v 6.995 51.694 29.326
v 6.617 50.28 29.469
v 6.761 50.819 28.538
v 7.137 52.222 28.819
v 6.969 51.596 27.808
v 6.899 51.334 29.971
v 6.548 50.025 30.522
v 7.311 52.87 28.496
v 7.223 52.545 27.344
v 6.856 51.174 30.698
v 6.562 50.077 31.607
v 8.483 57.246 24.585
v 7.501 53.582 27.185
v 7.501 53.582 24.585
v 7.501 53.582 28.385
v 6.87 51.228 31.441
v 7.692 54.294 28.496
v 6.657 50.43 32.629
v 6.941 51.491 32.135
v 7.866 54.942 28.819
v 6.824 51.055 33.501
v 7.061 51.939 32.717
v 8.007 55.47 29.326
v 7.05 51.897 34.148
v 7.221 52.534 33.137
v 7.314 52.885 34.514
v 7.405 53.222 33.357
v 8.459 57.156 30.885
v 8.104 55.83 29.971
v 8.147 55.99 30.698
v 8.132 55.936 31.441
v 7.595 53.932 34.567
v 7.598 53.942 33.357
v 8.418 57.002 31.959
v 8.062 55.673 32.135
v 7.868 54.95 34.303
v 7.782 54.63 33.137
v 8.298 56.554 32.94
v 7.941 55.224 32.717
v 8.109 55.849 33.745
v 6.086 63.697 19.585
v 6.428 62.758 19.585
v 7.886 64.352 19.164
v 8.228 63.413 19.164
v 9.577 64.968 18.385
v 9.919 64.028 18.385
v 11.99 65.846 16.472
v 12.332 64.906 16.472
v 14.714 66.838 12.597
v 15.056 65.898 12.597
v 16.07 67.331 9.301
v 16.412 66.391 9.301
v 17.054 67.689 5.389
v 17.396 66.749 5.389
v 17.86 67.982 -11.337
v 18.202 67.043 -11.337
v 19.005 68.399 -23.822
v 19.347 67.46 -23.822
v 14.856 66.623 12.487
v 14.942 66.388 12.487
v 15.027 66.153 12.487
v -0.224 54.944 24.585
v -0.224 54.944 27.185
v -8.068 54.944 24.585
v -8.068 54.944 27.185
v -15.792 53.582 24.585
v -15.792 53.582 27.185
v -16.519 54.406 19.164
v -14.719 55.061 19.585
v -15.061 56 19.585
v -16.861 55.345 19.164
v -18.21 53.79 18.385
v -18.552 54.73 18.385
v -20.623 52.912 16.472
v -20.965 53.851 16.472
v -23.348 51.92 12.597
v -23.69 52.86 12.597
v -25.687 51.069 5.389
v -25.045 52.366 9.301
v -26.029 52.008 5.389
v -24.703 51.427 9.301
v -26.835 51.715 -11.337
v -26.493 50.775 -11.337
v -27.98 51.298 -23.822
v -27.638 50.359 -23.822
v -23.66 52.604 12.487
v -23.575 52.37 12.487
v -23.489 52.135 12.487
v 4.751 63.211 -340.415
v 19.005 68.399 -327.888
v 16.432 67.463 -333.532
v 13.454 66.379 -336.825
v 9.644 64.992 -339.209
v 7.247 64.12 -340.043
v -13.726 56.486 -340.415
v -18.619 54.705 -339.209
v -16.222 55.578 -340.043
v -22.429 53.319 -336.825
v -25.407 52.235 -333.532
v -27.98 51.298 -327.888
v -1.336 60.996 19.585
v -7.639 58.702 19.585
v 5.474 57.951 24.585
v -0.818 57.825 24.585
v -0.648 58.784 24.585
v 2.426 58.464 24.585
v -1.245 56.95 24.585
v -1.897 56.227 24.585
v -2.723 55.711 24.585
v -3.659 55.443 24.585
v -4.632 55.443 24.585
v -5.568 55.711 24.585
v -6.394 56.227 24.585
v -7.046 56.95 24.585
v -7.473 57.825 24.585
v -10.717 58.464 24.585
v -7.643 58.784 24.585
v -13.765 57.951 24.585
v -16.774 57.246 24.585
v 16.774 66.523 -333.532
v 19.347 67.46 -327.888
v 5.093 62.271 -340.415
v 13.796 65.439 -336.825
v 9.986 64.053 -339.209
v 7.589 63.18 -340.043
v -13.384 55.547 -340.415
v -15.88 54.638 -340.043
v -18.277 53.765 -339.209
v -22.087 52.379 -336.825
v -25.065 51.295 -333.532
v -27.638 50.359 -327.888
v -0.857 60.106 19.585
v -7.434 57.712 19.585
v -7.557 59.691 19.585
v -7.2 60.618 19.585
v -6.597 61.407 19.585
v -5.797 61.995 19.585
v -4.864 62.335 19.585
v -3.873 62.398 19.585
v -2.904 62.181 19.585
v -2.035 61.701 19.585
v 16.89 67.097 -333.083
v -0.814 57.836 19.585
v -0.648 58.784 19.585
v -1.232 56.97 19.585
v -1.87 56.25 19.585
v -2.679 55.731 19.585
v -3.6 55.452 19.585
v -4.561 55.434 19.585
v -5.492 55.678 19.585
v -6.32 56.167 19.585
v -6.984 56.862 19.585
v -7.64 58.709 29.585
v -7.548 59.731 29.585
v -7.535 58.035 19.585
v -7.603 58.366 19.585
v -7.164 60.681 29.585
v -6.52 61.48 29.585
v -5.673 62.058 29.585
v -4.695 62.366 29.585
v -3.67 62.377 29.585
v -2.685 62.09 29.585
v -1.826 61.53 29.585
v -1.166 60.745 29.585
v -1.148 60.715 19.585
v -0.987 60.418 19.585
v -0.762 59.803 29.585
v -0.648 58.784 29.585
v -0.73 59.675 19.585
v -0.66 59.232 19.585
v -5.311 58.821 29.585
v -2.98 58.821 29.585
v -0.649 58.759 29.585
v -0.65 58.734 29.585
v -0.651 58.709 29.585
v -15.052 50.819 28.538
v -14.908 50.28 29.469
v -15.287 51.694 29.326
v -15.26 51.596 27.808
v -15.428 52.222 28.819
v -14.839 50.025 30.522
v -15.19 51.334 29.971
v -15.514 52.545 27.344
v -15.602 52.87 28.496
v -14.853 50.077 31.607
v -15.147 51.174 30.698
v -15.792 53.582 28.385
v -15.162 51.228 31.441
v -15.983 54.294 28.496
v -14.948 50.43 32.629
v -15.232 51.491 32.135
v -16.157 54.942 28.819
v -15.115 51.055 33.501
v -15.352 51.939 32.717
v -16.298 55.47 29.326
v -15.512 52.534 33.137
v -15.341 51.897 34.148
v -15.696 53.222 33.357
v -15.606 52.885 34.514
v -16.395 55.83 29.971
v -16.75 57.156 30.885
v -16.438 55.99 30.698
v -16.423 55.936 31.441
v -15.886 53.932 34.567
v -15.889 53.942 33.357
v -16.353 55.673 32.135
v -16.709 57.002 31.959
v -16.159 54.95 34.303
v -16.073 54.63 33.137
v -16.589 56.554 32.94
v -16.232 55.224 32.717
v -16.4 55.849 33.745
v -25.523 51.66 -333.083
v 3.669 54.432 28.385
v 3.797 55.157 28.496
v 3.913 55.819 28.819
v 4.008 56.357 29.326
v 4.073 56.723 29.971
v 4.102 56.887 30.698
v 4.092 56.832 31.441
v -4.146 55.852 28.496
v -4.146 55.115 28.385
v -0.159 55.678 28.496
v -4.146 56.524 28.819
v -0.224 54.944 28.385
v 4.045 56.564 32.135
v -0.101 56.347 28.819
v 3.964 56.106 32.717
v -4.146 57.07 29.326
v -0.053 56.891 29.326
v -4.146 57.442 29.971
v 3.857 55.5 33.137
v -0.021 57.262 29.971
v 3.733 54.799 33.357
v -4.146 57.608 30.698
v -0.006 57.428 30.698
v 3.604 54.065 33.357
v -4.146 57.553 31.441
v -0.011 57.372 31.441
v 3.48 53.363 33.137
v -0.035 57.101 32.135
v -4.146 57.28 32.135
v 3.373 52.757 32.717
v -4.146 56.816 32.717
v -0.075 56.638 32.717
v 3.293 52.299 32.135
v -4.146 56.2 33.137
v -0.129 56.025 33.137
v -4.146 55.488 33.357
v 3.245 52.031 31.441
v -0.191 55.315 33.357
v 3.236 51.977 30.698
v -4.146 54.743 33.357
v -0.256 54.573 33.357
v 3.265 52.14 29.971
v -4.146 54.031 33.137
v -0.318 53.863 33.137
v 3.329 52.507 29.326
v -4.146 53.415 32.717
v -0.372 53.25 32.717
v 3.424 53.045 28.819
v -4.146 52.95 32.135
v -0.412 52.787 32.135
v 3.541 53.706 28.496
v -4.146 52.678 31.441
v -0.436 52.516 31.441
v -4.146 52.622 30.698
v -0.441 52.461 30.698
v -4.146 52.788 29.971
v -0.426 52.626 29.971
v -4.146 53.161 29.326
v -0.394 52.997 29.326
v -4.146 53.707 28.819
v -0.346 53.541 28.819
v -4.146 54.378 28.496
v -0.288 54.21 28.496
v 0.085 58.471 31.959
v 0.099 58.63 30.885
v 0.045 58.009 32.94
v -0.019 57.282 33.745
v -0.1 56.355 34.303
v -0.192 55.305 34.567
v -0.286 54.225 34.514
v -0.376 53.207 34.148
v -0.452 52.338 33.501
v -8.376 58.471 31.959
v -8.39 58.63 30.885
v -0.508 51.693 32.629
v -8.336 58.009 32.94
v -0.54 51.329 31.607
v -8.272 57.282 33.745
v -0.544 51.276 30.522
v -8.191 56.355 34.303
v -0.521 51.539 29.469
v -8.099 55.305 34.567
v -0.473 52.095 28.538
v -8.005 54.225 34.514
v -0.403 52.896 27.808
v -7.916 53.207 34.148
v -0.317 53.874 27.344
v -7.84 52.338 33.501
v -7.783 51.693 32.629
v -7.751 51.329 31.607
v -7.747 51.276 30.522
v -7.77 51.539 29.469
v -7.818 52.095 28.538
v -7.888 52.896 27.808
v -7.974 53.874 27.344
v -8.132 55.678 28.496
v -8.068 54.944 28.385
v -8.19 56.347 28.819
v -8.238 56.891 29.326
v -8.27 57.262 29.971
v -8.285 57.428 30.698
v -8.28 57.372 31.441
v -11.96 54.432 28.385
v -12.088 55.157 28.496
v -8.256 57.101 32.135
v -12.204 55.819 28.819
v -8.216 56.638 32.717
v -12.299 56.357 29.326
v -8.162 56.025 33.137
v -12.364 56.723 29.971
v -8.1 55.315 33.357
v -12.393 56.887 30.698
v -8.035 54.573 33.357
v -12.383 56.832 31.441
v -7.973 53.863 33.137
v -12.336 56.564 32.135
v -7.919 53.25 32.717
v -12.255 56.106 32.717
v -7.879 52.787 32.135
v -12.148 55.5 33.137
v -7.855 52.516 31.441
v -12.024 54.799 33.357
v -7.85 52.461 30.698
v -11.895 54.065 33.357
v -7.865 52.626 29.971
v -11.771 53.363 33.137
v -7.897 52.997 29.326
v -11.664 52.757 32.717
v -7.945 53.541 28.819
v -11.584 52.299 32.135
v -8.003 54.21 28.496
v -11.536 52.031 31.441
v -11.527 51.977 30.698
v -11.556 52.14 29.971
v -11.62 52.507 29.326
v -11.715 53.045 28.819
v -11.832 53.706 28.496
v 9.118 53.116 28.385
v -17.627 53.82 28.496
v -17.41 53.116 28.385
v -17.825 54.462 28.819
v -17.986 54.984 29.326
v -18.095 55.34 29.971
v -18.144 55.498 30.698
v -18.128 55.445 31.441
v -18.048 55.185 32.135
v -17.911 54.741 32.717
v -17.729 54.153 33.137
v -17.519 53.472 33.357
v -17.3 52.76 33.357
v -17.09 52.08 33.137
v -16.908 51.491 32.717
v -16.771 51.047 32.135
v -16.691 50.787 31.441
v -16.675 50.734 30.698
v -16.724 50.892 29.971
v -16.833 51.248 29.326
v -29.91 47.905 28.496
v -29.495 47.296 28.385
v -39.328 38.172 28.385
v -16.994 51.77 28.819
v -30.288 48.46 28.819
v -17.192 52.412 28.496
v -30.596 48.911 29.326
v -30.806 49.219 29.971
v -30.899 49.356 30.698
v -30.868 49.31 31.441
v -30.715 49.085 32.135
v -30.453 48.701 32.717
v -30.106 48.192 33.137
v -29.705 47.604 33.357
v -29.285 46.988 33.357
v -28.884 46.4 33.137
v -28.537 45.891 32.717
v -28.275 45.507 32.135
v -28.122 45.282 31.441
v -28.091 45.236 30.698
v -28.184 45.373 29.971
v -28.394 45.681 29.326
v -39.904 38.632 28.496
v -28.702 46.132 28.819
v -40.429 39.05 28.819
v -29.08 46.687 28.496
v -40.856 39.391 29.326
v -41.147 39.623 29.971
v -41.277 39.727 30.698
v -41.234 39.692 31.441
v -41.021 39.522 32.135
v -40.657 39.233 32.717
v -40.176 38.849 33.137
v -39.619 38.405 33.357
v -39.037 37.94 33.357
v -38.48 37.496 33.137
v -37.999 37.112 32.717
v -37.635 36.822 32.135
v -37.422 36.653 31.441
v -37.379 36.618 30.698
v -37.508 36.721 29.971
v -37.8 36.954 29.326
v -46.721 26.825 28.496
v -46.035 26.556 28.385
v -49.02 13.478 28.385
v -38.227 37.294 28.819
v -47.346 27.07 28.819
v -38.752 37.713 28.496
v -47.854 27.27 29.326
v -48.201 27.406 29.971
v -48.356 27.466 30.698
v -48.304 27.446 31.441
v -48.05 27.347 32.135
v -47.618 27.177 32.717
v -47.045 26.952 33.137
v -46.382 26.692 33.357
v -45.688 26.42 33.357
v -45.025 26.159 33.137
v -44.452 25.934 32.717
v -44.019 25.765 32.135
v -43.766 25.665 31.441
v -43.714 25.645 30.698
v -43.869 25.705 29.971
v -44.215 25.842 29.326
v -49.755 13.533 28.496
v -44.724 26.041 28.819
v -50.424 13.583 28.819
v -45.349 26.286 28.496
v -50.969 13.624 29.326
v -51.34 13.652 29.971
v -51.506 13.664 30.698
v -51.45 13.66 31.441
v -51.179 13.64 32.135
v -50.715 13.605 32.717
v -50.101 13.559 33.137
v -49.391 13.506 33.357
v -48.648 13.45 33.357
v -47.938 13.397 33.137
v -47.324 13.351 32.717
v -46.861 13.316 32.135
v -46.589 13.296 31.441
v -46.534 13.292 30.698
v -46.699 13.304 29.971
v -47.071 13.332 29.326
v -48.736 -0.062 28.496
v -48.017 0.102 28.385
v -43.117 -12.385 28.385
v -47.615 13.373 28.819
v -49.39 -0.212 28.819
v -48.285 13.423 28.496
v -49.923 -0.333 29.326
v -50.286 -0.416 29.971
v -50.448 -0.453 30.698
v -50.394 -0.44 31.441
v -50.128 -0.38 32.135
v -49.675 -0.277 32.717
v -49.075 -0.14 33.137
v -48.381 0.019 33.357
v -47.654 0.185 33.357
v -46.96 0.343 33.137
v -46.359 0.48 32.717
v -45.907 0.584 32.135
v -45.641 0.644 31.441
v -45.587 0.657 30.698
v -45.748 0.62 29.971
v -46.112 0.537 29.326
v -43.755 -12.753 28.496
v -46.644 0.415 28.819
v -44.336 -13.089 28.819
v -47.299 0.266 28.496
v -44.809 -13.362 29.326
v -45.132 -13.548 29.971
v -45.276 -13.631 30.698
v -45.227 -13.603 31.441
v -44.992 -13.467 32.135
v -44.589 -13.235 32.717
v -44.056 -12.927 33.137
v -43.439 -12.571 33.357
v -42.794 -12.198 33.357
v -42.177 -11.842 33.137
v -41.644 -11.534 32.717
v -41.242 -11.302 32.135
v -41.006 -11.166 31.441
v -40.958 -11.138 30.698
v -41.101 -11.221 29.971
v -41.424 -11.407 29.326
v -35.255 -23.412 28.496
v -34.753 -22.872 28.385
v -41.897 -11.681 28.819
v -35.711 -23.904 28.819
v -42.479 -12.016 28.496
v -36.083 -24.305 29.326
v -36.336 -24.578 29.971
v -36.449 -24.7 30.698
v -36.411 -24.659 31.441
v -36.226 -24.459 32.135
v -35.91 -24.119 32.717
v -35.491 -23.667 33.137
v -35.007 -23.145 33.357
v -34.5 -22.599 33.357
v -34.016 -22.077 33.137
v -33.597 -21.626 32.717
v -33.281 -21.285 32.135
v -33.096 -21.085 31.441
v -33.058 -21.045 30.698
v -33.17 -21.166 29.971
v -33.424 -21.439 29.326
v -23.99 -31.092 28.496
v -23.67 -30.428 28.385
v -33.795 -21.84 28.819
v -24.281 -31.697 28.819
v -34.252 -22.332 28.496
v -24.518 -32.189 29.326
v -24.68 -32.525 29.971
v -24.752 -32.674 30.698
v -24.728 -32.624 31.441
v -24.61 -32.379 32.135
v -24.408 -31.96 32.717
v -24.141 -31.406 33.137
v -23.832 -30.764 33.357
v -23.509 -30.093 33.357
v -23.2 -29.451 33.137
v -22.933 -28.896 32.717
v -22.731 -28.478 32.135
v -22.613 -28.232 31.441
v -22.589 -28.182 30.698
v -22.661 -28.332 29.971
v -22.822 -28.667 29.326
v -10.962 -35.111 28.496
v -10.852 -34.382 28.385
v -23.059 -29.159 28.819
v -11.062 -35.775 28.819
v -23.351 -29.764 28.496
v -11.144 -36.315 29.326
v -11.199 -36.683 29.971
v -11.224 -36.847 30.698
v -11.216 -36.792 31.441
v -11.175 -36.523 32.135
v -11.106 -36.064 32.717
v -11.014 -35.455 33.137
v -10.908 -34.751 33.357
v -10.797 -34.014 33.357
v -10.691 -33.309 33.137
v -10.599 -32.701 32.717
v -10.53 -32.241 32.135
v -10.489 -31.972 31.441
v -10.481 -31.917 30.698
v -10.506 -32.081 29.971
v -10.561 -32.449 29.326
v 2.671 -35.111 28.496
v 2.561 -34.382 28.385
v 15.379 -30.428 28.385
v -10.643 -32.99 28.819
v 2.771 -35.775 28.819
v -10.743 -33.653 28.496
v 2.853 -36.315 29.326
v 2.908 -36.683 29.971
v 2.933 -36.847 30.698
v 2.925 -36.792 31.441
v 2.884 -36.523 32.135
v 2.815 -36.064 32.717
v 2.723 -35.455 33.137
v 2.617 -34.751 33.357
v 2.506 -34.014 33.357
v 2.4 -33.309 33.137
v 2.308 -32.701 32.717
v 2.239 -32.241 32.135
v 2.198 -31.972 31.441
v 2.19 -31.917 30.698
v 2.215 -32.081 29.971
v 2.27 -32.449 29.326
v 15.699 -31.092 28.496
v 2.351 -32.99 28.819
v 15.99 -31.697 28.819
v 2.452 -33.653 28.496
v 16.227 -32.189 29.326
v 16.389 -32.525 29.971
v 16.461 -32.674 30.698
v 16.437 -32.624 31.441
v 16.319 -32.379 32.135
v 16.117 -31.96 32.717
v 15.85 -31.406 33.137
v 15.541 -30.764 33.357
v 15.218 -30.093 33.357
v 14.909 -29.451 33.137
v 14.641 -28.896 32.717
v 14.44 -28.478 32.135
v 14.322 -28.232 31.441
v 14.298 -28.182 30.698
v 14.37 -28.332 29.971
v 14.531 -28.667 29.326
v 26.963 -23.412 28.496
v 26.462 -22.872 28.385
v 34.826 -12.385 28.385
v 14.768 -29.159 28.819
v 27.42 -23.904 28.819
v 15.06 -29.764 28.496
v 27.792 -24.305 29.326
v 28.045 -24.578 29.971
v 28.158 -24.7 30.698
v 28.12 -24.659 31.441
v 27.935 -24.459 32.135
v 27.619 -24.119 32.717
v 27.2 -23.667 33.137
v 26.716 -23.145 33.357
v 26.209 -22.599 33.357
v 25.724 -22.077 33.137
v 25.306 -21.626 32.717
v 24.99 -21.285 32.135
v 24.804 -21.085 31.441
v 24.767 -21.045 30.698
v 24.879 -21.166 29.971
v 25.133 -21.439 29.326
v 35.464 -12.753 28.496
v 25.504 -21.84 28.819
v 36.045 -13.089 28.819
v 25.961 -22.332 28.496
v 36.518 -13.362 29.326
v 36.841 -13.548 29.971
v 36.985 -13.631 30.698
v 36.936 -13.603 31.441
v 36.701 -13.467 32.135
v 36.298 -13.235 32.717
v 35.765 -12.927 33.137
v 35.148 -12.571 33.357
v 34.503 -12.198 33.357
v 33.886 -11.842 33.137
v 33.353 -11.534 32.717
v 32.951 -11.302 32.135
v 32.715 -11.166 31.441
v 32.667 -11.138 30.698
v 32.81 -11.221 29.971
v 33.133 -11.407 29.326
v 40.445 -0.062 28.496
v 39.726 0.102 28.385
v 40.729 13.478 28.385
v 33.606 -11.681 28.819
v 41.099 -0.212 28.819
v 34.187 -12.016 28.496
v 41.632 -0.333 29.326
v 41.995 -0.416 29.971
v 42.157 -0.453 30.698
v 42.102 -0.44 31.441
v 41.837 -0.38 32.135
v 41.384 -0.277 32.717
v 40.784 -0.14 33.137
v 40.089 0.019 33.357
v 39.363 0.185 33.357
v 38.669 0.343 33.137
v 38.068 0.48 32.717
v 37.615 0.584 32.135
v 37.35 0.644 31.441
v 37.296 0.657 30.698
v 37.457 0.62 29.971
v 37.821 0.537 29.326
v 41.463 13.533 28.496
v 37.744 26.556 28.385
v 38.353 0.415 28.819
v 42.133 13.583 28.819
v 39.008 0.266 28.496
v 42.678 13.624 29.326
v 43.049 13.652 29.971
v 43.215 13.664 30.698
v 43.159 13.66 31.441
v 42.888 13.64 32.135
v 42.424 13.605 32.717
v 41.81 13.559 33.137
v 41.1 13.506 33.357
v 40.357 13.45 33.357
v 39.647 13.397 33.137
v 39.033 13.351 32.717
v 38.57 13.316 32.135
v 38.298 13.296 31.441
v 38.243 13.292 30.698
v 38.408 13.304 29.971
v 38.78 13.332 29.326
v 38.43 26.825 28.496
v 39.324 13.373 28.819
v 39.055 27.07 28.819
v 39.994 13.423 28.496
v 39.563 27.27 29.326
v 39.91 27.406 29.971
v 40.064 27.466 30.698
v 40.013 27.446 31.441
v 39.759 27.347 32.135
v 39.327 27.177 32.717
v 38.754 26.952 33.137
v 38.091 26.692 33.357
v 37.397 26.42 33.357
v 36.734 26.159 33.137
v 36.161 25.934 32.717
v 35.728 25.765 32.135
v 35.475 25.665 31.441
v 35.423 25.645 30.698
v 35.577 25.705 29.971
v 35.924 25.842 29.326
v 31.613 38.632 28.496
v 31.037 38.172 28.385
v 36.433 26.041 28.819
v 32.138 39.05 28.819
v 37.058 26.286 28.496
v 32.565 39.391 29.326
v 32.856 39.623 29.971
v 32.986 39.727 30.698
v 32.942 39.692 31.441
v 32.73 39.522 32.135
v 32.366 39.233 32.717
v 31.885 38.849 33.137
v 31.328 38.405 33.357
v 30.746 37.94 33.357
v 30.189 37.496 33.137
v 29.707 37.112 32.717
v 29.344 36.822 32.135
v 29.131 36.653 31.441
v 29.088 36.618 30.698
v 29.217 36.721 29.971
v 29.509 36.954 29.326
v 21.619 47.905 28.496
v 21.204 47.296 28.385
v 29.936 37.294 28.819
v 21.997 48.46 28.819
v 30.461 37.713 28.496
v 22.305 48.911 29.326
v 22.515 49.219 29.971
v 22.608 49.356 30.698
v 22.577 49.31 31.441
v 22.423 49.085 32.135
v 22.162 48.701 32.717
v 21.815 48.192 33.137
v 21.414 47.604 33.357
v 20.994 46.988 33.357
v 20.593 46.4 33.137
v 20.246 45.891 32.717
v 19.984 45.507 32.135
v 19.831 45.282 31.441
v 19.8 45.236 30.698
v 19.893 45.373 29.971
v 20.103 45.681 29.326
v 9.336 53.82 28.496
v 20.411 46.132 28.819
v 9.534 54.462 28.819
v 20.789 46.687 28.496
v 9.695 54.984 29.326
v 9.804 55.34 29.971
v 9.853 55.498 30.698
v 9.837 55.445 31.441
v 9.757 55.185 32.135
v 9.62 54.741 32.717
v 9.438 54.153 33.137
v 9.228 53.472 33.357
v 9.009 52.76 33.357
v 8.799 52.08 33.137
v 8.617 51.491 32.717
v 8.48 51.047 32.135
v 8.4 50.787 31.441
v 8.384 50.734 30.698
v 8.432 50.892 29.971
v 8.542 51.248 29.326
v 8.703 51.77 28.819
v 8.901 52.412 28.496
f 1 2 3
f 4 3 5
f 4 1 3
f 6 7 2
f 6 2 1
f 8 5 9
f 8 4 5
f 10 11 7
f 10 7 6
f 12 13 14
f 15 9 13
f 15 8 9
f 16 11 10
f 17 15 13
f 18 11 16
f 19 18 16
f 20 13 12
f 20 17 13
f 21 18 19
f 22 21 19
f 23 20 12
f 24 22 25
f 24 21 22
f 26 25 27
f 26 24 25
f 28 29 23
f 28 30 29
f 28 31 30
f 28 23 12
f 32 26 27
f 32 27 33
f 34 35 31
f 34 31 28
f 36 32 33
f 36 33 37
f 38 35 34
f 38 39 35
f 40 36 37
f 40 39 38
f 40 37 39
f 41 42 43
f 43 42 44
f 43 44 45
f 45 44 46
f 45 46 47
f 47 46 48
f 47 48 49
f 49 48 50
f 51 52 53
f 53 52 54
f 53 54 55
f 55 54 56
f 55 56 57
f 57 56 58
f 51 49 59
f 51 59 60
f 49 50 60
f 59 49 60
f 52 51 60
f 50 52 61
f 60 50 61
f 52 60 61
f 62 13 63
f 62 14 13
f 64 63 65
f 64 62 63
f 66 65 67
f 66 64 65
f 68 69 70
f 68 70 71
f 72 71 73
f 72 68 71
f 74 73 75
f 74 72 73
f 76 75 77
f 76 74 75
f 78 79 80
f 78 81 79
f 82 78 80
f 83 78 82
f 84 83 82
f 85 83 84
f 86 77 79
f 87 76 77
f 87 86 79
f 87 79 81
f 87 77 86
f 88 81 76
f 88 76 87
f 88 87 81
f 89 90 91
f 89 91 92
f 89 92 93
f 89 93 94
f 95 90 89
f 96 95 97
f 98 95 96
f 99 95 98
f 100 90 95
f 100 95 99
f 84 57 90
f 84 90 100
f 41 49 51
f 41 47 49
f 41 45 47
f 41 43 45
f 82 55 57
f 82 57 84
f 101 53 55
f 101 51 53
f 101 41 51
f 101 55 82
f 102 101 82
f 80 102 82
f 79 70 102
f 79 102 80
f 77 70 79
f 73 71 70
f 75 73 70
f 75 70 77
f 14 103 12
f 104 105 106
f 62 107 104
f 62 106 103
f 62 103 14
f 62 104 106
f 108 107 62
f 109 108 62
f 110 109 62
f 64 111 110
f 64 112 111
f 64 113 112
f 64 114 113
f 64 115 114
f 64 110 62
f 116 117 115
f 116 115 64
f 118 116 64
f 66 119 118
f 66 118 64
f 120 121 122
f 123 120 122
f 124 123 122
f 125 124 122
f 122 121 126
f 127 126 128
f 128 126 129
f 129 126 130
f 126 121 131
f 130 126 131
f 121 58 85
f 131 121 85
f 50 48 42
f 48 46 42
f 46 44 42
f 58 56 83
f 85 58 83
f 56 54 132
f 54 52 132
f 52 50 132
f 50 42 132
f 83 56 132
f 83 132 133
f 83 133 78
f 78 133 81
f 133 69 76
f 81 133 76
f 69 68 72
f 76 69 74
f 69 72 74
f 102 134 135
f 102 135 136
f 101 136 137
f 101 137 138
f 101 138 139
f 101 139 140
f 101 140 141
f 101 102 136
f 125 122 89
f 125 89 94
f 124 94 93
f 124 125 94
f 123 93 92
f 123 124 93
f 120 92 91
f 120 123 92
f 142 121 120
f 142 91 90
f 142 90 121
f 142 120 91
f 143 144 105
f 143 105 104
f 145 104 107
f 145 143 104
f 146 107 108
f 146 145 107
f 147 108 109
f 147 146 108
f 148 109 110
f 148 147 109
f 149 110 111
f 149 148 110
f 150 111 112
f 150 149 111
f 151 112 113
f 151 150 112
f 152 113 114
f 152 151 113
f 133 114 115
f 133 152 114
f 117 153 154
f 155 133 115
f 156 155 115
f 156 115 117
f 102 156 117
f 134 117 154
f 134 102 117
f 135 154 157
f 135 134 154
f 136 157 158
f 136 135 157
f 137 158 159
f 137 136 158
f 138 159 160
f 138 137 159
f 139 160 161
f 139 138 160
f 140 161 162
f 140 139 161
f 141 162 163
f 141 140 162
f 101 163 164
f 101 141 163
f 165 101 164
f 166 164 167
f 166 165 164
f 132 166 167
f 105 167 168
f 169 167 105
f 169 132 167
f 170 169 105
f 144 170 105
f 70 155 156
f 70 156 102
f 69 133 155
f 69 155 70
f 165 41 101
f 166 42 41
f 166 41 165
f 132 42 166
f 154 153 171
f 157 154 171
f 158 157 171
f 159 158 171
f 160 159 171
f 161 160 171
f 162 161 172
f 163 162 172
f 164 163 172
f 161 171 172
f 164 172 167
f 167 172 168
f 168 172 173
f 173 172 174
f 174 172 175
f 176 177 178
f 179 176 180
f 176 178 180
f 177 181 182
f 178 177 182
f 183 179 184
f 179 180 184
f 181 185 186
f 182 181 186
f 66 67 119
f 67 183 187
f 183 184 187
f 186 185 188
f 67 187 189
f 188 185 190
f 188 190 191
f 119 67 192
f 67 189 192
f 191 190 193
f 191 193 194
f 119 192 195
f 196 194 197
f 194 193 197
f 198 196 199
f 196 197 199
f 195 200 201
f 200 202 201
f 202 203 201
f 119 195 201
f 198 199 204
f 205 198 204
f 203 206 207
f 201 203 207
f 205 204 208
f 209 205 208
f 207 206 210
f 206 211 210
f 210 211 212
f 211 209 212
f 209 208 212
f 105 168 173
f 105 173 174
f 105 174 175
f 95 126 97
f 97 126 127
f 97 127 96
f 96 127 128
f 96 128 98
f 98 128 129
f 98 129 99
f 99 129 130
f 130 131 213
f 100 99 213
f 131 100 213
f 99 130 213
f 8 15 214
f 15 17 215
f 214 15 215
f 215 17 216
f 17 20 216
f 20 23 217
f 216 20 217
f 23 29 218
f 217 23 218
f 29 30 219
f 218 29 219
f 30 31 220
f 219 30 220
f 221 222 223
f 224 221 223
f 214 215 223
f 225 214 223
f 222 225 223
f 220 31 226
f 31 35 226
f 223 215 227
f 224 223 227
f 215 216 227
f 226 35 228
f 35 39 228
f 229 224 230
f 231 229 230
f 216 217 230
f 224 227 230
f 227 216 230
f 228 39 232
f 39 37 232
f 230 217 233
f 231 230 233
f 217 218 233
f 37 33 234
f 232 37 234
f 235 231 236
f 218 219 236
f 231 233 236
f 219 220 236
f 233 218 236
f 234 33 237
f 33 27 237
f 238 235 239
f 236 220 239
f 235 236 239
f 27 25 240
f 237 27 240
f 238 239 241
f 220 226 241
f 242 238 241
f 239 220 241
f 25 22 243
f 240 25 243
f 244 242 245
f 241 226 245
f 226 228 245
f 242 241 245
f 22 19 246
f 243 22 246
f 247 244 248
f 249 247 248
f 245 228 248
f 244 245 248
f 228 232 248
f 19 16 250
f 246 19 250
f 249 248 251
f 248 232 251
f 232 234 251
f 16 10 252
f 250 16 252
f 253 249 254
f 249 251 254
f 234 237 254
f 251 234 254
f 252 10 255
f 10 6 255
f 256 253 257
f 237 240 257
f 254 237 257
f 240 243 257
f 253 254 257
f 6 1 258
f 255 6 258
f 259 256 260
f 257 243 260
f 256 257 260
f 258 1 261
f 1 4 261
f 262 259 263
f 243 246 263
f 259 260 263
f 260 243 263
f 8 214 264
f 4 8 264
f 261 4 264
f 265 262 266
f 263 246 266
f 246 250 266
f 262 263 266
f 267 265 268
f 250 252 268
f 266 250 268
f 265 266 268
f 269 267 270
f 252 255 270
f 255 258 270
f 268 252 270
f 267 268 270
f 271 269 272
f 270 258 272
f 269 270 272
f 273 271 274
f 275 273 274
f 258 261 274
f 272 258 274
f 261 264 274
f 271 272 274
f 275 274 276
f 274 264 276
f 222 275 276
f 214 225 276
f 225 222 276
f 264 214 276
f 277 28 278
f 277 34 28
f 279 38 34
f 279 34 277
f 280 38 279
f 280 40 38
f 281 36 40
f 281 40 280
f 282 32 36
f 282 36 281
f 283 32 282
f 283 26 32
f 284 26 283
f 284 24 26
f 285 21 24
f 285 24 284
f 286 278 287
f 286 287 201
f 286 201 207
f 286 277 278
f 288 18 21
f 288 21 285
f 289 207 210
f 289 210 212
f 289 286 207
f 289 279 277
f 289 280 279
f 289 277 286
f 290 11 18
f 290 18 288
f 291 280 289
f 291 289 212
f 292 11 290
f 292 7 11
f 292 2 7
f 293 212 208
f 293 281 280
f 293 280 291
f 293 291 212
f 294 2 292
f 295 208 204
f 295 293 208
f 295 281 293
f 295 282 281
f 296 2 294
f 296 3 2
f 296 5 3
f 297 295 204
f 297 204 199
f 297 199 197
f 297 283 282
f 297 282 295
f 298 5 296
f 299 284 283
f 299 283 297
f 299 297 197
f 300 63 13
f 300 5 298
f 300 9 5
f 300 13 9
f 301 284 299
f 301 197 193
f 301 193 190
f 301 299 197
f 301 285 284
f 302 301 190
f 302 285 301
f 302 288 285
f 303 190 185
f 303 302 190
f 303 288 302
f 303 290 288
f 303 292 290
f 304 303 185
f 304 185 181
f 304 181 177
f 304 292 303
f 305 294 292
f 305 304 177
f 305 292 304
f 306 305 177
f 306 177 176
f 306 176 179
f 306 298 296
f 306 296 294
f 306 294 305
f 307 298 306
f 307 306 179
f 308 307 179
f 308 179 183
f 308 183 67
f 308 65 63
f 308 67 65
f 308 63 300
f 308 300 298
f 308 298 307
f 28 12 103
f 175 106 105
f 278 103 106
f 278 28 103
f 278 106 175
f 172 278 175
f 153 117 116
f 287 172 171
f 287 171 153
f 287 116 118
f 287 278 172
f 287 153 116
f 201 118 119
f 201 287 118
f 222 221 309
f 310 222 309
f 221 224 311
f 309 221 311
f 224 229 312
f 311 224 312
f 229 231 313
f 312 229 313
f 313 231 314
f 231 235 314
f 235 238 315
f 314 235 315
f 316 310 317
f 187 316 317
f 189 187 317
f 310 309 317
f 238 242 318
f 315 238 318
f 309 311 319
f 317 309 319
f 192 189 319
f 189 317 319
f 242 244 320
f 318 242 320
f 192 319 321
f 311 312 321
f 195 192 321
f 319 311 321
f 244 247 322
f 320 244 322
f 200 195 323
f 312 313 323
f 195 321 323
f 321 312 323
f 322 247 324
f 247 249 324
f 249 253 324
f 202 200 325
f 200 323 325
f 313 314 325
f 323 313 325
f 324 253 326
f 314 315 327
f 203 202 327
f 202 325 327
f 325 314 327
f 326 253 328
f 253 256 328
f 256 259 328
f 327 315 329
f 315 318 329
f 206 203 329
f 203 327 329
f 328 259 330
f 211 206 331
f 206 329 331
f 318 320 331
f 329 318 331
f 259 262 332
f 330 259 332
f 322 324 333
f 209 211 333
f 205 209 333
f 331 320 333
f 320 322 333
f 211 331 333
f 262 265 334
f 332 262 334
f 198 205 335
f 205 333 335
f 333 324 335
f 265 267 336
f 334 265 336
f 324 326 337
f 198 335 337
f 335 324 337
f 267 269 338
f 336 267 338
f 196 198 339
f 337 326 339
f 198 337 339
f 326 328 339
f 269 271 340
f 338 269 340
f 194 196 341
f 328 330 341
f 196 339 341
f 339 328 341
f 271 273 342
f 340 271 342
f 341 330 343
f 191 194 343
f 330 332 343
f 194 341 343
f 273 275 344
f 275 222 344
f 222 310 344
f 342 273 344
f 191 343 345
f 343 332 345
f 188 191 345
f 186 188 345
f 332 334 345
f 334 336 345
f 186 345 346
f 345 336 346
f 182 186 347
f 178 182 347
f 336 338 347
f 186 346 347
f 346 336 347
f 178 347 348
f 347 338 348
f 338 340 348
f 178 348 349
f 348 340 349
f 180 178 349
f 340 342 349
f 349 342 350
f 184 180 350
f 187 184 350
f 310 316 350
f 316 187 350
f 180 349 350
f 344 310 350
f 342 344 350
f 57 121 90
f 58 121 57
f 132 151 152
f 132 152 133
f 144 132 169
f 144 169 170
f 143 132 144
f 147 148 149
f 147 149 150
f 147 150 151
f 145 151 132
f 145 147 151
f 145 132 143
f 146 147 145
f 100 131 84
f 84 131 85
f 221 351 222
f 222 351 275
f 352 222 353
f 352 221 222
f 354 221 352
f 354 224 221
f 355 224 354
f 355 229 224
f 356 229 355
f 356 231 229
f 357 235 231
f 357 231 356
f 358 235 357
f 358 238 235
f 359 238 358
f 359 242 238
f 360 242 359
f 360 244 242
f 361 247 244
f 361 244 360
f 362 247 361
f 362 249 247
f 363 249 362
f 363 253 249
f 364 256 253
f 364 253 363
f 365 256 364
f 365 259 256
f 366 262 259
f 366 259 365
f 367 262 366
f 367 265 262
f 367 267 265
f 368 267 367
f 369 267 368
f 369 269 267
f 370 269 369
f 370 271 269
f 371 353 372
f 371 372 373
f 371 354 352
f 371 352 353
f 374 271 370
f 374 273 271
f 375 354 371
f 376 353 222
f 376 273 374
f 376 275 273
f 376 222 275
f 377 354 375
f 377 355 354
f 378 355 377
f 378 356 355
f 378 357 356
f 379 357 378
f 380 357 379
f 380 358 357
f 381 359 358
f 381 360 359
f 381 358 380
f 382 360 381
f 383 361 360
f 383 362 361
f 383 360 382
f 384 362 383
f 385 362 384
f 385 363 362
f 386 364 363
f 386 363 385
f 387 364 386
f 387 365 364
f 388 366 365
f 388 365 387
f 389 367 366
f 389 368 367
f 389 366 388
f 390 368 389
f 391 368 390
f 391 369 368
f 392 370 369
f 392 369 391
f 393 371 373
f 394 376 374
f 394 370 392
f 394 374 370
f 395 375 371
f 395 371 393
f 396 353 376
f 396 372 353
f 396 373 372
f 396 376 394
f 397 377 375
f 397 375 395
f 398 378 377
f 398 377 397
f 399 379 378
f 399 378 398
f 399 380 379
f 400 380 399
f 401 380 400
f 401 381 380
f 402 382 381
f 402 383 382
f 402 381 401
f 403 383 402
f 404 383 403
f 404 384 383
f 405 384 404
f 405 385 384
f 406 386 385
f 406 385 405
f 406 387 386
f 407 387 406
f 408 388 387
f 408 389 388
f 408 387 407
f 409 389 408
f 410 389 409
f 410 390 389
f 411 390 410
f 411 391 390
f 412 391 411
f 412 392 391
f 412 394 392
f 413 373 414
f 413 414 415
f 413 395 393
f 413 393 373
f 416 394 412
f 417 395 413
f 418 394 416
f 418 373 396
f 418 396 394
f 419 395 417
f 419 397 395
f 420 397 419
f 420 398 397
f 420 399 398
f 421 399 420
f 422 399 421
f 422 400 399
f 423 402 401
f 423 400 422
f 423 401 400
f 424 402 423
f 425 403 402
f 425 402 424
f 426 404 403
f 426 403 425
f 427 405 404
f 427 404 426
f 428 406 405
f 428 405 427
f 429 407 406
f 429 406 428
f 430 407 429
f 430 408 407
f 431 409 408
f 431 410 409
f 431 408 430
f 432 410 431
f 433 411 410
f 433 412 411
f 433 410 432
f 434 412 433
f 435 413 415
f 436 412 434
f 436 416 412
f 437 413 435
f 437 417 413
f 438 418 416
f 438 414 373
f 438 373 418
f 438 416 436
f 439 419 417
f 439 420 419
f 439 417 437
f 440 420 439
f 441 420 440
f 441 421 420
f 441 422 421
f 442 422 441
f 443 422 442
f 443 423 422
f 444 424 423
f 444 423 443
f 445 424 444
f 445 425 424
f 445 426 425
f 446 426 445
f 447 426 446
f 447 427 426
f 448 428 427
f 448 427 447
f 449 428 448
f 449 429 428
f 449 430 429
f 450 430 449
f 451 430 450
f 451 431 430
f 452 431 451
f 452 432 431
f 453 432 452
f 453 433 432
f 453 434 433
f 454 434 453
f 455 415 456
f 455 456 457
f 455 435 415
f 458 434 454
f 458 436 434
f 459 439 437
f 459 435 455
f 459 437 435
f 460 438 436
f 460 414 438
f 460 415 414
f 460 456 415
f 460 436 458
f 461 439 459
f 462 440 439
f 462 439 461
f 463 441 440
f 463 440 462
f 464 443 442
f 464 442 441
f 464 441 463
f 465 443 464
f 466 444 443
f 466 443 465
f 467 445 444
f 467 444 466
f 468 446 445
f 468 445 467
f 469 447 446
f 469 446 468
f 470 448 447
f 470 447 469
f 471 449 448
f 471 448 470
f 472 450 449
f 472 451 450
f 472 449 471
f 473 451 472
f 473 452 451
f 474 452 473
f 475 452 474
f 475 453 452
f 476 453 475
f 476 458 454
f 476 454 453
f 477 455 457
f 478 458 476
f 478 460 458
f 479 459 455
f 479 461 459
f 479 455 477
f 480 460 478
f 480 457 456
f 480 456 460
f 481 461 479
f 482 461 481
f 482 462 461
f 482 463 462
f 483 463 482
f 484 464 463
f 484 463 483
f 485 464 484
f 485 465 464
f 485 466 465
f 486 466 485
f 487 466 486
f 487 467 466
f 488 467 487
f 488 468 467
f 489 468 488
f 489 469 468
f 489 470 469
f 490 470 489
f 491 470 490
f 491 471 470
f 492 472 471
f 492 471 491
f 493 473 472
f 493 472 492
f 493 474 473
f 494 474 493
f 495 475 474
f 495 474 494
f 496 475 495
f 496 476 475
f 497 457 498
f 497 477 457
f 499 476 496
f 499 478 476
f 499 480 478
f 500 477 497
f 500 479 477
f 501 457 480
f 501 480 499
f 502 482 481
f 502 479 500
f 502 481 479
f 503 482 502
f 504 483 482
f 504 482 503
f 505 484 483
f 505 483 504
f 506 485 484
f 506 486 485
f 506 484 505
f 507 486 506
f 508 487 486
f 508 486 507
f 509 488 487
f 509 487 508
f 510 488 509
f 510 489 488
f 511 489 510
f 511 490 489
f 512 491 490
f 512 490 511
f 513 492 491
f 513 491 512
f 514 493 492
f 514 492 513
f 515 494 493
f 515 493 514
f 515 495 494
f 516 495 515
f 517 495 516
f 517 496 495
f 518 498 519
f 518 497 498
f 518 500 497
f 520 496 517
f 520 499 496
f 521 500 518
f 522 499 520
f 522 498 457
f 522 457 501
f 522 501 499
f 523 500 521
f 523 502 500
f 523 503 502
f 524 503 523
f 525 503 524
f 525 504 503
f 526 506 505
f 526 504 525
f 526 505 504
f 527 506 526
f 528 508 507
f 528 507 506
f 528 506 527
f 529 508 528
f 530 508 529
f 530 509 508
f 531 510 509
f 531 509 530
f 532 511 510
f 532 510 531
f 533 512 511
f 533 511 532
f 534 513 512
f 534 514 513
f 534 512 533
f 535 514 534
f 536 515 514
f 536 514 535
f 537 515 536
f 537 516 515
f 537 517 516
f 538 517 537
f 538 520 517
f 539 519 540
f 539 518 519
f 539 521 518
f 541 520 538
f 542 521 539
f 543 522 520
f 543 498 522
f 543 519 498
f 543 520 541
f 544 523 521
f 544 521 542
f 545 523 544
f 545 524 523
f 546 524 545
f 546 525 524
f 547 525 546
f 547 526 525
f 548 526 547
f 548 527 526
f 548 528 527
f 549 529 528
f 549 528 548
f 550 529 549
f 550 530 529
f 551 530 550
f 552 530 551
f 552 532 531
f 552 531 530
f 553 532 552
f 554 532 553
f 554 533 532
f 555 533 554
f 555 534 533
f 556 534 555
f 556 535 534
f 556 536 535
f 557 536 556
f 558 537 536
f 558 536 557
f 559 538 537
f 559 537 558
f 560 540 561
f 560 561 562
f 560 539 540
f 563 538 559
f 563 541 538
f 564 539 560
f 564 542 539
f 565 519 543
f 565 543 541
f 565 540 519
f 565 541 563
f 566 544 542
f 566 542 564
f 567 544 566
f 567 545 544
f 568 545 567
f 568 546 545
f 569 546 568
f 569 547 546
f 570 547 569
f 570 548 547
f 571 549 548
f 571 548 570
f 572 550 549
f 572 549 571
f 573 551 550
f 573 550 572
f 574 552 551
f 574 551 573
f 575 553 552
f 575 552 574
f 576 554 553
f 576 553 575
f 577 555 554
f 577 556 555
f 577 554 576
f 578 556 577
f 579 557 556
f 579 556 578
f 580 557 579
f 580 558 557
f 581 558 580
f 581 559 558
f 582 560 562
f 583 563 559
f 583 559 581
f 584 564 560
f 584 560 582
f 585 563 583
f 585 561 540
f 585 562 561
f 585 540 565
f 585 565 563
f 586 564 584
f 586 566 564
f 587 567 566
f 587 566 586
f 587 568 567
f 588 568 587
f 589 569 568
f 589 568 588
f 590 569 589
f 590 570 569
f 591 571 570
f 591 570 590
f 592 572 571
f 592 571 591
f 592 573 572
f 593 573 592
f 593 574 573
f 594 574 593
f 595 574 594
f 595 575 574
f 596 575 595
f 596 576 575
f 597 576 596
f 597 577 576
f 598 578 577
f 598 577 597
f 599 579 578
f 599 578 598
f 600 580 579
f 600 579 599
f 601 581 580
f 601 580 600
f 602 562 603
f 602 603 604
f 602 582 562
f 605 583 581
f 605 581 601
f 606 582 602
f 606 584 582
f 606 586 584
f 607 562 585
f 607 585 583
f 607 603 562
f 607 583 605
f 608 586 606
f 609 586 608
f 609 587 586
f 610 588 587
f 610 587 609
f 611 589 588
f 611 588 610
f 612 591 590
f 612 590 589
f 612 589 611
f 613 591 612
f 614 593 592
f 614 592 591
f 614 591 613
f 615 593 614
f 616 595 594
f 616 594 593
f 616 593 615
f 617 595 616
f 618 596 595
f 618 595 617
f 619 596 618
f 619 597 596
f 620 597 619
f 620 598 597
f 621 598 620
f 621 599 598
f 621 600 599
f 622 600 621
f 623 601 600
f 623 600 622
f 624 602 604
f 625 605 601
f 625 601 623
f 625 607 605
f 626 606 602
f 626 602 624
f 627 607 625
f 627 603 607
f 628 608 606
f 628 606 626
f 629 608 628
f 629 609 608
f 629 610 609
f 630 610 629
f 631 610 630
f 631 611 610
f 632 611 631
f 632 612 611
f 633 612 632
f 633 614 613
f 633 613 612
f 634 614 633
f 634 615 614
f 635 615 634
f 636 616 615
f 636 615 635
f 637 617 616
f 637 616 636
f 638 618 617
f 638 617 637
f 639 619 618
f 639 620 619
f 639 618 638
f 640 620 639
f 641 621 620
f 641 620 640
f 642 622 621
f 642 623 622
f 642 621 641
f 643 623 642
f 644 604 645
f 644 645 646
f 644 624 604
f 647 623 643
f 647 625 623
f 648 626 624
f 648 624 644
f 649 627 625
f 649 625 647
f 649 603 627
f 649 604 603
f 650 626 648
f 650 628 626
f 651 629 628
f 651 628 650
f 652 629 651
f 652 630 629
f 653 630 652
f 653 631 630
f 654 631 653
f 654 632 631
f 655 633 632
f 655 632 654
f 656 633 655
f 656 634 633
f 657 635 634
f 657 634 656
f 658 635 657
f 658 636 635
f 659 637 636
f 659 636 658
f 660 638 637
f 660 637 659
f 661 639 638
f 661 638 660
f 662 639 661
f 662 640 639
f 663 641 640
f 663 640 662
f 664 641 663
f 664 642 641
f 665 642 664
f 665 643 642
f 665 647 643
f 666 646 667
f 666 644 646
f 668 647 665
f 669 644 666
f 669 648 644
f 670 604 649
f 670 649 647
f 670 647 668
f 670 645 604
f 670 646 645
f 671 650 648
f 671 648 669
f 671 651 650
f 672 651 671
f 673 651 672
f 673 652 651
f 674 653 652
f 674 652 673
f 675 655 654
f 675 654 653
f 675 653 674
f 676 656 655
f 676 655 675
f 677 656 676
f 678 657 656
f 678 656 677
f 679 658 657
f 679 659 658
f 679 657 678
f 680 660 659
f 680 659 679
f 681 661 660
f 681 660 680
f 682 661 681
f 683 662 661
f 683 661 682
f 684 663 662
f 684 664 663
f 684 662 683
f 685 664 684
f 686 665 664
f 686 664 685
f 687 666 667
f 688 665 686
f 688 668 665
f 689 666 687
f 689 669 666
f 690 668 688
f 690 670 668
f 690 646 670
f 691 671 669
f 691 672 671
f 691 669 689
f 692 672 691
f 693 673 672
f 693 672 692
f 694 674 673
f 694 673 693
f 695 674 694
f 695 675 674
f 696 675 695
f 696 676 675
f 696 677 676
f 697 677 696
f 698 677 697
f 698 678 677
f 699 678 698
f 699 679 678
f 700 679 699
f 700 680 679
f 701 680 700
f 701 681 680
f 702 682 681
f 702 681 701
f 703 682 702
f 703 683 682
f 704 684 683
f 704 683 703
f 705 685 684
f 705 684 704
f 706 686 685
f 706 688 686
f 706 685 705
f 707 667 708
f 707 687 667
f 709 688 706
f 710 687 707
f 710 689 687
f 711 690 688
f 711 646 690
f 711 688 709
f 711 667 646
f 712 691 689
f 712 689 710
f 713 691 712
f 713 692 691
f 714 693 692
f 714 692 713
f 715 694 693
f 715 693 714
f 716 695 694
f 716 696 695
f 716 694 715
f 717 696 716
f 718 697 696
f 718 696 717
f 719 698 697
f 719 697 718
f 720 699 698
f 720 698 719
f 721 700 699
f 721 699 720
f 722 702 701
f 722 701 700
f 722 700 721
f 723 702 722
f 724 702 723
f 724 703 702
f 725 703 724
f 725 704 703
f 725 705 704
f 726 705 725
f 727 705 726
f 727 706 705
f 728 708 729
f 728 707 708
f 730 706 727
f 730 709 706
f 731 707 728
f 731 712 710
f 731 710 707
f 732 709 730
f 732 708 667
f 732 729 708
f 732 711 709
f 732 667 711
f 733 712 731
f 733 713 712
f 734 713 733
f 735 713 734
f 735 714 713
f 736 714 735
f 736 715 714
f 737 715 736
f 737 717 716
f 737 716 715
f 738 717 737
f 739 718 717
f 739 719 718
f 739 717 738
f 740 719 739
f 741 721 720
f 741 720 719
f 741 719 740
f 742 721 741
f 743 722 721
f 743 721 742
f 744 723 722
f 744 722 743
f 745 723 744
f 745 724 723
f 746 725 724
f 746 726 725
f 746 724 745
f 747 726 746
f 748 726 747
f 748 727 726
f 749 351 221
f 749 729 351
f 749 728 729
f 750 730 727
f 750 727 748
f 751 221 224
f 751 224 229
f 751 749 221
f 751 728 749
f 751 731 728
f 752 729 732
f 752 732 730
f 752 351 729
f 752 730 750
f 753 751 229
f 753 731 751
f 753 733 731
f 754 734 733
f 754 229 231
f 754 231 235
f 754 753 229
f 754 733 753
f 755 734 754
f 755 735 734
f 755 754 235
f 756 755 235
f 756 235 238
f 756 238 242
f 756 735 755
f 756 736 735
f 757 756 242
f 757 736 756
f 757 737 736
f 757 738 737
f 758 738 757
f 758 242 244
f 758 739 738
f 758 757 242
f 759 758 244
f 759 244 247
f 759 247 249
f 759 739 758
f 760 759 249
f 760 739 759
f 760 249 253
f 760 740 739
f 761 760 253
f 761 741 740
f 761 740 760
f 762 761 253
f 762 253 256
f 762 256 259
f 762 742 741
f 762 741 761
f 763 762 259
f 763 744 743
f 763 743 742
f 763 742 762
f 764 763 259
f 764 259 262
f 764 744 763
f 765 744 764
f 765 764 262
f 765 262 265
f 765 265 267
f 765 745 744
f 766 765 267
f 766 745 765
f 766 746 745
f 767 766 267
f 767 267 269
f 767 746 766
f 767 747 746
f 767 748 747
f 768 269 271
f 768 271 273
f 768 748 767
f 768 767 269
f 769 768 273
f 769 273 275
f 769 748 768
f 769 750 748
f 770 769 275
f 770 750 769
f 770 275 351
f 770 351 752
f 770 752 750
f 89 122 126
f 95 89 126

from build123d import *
from build123d.topology import SkipClean

# Parameters (mm, degrees)
REVOLVE_4_ANGLE          = 30
SKETCH_4_R               = 3.5
EXTRUDE_1_DEPTH          = 5
SKETCH_7_W               = 50
SKETCH_7_H               = 360
EXTRUDE_2_DEPTH          = 1
CUT_EXTRUDE_1_DEPTH      = 343.944475712
CUT_EXTRUDE_1_DEPTH_BACK = 343.944475712
CUT_EXTRUDE_2_DEPTH      = 343.944475826
CUT_EXTRUDE_2_DEPTH_BACK = 343.944475826
SKETCH_10_R              = 2.5
SKETCH_13_R              = 2.5


# Read off the part's stored shape, not the designer's step: 旋转4
with BuildPart() as part:
    # 旋转4 outline → 旋转4 (revolve)
    with BuildSketch(Plane(origin=(-4.145535771, 10.115302746, 0), x_dir=(0.2588190451025214, 0.9659258262890681, 0), z_dir=(0.9659258262890681, -0.2588190451025214, 0))):
        with BuildLine():
            Line((48.79373495, 24.584801914), (48.7, 30.884801913))
            ThreePointArc((48.7, 30.884801913), (42.38370491, 33.501097003), (45, 27.184801913))
            Line((45, 27.184801913), (45, 24.584801914))
            Line((45, 24.584801914), (48.79373495, 24.584801914))
        make_face()
    revolve(axis=Axis((-4.145535771, 10.115302746, 0), (0, 0, 1)), revolution_arc=REVOLVE_4_ANGLE)

    # 草图4 → 凸台-拉伸1 (add, symmetric)
    with SkipClean():  # the faces are left unmerged after this step: merging them gives an invalid solid
        with BuildSketch(Plane(origin=(0, 0, 24.584801914), x_dir=(-1, 0, 0), z_dir=(0, 0, -1))):
            with Locations(Location((4.145535771, 58.909037696, 0), (0, 0, 182.055368844))):
                Circle(SKETCH_4_R)
        extrude(amount=EXTRUDE_1_DEPTH, both=True)

    # 草图7 → 凸台-拉伸2 (add)
    with SkipClean():  # the faces are left unmerged after this step: merging them gives an invalid solid
        with BuildSketch(Plane(origin=(-19.41793533, 53.35033885, 0), x_dir=(-0.9396926207859081, -0.34202014332566943, 0), z_dir=(-0.34202014332566943, 0.9396926207859081, 0))):
            with Locations((-16.252548143, -160.415198086)):
                Rectangle(SKETCH_7_W, SKETCH_7_H)
        extrude(amount=EXTRUDE_2_DEPTH)

    # 草图8 → 切除-拉伸1 (cut, two sides: drawn at the far end of the back side and taken through both)
    with SkipClean():  # the faces are left unmerged after this step: merging them gives an invalid solid
        with BuildSketch(Plane(origin=(-19.759955473, 54.290031471, 0), x_dir=(0.9396926207859082, 0.3420201433256695, 0), z_dir=(-0.3420201433256695, 0.9396926207859082, 0)).offset(-CUT_EXTRUDE_1_DEPTH_BACK)):
            with BuildLine():
                Line((41.252548143, -19.584801914), (41.252548143, 23.821846561))
                add(Edge.make_bspline(
                    [(27.504872765, -19.584801914), (31.73786331, -19.07232861), (36.657141019, -14.263450573), (39.412364189, -5.517206126), (40.655209173, 6.65100326), (39.363996158, 17.087656662), (41.252548143, 23.821846561)],
                    knots=[0.037048612, 0.037048612, 0.037048612, 0.037048612, 0.227677085, 0.340409594, 0.466381752, 0.809603539, 0.809603539, 0.809603539, 0.809603539], degree=3))
                Line((27.504872765, -19.584801914), (41.252548143, -19.584801914))
            make_face()
            with BuildLine():
                Line((-8.747451857, -19.584801914), (5.000223521, -19.584801914))
                add(Edge.make_bspline(
                    [(5.000223521, -19.584801914), (0.767232977, -19.07232861), (-4.152044732, -14.263450573), (-6.907267902, -5.517206126), (-8.150112886, 6.65100326), (-6.858899871, 17.087656662), (-8.747451857, 23.821846561)],
                    knots=[0.037048612, 0.037048612, 0.037048612, 0.037048612, 0.227677085, 0.340409594, 0.466381752, 0.809603539, 0.809603539, 0.809603539, 0.809603539], degree=3))
                Line((-8.747451857, 23.821846561), (-8.747451857, -19.584801914))
            make_face()
        extrude(amount=CUT_EXTRUDE_1_DEPTH + CUT_EXTRUDE_1_DEPTH_BACK, mode=Mode.SUBTRACT)

    # 草图9 → 切除-拉伸2 (cut, two sides: drawn at the far end of the back side and taken through both)
    with SkipClean():  # the faces are left unmerged after this step: merging them gives an invalid solid
        with BuildSketch(Plane(origin=(-19.759955473, 54.290031471, 0), x_dir=(0.9396926207859082, 0.3420201433256695, 0), z_dir=(-0.3420201433256695, 0.9396926207859082, 0)).offset(-CUT_EXTRUDE_2_DEPTH_BACK)):
            with BuildLine():
                add(Edge.make_bspline(
                    [(26.083588303, 340.415198086), (31.006568105, 340.211900579), (38.097666372, 336.040393165), (40.500108091, 329.801156179), (41.252548143, 327.888172846)],
                    knots=[0, 0, 0, 0, 0.427766373, 0.590490453, 0.590490453, 0.590490453, 0.590490453], degree=3))
                Line((41.252548143, 327.888172846), (41.252548143, 340.415198086))
                Line((41.252548143, 340.415198086), (26.083588303, 340.415198086))
            make_face()
            with BuildLine():
                add(Edge.make_bspline(
                    [(6.421507983, 340.415198086), (1.498528181, 340.211900579), (-5.592570086, 336.040393165), (-7.995011804, 329.801156179), (-8.747451857, 327.888172846)],
                    knots=[0, 0, 0, 0, 0.427766373, 0.590490453, 0.590490453, 0.590490453, 0.590490453], degree=3))
                Line((6.421507983, 340.415198086), (-8.747451857, 340.415198086))
                Line((-8.747451857, 340.415198086), (-8.747451857, 327.888172846))
            make_face()
        extrude(amount=CUT_EXTRUDE_2_DEPTH + CUT_EXTRUDE_2_DEPTH_BACK, mode=Mode.SUBTRACT)

    # 草图10 → 切除-旋转1 (revolve, cut)
    with SkipClean():  # the faces are left unmerged after this step: merging them gives an invalid solid
        with BuildSketch(Plane(origin=(-6.396663217, 1.713980743, 0), x_dir=(0, 0, -1), z_dir=(0.9659258262890681, -0.25881904510252135, 0)), mode=Mode.PRIVATE) as cut_revolve_1_sk:
            with Locations((-30.884801913, 53.697688553)):
                Circle(SKETCH_10_R)
        revolve(cut_revolve_1_sk.sketch.rotate(Axis((-4.145535771, 10.115302746, 0), (0, 0, 1)), 15), axis=Axis((-4.145535771, 10.115302746, 0), (0, 0, 1)), mode=Mode.SUBTRACT)


with BuildPart() as body_2:
    # 草图13 → 旋转5 (revolve)
    with BuildSketch(Plane(origin=(-6.396663217, 1.713980743, 0), x_dir=(0, 0, -1), z_dir=(0.9659258262890681, -0.25881904510252135, 0)), mode=Mode.PRIVATE) as revolve_5_sk:
        with Locations((-30.884801913, 53.697688553)):
            Circle(SKETCH_13_R)
    revolve(revolve_5_sk.sketch.rotate(Axis((-4.145535771, 10.115302746, 0), (0, 0, 1)), 15), axis=Axis((-4.145535771, 10.115302746, 0), (0, 0, 1)))


solid = Compound([part.part, body_2.part])
